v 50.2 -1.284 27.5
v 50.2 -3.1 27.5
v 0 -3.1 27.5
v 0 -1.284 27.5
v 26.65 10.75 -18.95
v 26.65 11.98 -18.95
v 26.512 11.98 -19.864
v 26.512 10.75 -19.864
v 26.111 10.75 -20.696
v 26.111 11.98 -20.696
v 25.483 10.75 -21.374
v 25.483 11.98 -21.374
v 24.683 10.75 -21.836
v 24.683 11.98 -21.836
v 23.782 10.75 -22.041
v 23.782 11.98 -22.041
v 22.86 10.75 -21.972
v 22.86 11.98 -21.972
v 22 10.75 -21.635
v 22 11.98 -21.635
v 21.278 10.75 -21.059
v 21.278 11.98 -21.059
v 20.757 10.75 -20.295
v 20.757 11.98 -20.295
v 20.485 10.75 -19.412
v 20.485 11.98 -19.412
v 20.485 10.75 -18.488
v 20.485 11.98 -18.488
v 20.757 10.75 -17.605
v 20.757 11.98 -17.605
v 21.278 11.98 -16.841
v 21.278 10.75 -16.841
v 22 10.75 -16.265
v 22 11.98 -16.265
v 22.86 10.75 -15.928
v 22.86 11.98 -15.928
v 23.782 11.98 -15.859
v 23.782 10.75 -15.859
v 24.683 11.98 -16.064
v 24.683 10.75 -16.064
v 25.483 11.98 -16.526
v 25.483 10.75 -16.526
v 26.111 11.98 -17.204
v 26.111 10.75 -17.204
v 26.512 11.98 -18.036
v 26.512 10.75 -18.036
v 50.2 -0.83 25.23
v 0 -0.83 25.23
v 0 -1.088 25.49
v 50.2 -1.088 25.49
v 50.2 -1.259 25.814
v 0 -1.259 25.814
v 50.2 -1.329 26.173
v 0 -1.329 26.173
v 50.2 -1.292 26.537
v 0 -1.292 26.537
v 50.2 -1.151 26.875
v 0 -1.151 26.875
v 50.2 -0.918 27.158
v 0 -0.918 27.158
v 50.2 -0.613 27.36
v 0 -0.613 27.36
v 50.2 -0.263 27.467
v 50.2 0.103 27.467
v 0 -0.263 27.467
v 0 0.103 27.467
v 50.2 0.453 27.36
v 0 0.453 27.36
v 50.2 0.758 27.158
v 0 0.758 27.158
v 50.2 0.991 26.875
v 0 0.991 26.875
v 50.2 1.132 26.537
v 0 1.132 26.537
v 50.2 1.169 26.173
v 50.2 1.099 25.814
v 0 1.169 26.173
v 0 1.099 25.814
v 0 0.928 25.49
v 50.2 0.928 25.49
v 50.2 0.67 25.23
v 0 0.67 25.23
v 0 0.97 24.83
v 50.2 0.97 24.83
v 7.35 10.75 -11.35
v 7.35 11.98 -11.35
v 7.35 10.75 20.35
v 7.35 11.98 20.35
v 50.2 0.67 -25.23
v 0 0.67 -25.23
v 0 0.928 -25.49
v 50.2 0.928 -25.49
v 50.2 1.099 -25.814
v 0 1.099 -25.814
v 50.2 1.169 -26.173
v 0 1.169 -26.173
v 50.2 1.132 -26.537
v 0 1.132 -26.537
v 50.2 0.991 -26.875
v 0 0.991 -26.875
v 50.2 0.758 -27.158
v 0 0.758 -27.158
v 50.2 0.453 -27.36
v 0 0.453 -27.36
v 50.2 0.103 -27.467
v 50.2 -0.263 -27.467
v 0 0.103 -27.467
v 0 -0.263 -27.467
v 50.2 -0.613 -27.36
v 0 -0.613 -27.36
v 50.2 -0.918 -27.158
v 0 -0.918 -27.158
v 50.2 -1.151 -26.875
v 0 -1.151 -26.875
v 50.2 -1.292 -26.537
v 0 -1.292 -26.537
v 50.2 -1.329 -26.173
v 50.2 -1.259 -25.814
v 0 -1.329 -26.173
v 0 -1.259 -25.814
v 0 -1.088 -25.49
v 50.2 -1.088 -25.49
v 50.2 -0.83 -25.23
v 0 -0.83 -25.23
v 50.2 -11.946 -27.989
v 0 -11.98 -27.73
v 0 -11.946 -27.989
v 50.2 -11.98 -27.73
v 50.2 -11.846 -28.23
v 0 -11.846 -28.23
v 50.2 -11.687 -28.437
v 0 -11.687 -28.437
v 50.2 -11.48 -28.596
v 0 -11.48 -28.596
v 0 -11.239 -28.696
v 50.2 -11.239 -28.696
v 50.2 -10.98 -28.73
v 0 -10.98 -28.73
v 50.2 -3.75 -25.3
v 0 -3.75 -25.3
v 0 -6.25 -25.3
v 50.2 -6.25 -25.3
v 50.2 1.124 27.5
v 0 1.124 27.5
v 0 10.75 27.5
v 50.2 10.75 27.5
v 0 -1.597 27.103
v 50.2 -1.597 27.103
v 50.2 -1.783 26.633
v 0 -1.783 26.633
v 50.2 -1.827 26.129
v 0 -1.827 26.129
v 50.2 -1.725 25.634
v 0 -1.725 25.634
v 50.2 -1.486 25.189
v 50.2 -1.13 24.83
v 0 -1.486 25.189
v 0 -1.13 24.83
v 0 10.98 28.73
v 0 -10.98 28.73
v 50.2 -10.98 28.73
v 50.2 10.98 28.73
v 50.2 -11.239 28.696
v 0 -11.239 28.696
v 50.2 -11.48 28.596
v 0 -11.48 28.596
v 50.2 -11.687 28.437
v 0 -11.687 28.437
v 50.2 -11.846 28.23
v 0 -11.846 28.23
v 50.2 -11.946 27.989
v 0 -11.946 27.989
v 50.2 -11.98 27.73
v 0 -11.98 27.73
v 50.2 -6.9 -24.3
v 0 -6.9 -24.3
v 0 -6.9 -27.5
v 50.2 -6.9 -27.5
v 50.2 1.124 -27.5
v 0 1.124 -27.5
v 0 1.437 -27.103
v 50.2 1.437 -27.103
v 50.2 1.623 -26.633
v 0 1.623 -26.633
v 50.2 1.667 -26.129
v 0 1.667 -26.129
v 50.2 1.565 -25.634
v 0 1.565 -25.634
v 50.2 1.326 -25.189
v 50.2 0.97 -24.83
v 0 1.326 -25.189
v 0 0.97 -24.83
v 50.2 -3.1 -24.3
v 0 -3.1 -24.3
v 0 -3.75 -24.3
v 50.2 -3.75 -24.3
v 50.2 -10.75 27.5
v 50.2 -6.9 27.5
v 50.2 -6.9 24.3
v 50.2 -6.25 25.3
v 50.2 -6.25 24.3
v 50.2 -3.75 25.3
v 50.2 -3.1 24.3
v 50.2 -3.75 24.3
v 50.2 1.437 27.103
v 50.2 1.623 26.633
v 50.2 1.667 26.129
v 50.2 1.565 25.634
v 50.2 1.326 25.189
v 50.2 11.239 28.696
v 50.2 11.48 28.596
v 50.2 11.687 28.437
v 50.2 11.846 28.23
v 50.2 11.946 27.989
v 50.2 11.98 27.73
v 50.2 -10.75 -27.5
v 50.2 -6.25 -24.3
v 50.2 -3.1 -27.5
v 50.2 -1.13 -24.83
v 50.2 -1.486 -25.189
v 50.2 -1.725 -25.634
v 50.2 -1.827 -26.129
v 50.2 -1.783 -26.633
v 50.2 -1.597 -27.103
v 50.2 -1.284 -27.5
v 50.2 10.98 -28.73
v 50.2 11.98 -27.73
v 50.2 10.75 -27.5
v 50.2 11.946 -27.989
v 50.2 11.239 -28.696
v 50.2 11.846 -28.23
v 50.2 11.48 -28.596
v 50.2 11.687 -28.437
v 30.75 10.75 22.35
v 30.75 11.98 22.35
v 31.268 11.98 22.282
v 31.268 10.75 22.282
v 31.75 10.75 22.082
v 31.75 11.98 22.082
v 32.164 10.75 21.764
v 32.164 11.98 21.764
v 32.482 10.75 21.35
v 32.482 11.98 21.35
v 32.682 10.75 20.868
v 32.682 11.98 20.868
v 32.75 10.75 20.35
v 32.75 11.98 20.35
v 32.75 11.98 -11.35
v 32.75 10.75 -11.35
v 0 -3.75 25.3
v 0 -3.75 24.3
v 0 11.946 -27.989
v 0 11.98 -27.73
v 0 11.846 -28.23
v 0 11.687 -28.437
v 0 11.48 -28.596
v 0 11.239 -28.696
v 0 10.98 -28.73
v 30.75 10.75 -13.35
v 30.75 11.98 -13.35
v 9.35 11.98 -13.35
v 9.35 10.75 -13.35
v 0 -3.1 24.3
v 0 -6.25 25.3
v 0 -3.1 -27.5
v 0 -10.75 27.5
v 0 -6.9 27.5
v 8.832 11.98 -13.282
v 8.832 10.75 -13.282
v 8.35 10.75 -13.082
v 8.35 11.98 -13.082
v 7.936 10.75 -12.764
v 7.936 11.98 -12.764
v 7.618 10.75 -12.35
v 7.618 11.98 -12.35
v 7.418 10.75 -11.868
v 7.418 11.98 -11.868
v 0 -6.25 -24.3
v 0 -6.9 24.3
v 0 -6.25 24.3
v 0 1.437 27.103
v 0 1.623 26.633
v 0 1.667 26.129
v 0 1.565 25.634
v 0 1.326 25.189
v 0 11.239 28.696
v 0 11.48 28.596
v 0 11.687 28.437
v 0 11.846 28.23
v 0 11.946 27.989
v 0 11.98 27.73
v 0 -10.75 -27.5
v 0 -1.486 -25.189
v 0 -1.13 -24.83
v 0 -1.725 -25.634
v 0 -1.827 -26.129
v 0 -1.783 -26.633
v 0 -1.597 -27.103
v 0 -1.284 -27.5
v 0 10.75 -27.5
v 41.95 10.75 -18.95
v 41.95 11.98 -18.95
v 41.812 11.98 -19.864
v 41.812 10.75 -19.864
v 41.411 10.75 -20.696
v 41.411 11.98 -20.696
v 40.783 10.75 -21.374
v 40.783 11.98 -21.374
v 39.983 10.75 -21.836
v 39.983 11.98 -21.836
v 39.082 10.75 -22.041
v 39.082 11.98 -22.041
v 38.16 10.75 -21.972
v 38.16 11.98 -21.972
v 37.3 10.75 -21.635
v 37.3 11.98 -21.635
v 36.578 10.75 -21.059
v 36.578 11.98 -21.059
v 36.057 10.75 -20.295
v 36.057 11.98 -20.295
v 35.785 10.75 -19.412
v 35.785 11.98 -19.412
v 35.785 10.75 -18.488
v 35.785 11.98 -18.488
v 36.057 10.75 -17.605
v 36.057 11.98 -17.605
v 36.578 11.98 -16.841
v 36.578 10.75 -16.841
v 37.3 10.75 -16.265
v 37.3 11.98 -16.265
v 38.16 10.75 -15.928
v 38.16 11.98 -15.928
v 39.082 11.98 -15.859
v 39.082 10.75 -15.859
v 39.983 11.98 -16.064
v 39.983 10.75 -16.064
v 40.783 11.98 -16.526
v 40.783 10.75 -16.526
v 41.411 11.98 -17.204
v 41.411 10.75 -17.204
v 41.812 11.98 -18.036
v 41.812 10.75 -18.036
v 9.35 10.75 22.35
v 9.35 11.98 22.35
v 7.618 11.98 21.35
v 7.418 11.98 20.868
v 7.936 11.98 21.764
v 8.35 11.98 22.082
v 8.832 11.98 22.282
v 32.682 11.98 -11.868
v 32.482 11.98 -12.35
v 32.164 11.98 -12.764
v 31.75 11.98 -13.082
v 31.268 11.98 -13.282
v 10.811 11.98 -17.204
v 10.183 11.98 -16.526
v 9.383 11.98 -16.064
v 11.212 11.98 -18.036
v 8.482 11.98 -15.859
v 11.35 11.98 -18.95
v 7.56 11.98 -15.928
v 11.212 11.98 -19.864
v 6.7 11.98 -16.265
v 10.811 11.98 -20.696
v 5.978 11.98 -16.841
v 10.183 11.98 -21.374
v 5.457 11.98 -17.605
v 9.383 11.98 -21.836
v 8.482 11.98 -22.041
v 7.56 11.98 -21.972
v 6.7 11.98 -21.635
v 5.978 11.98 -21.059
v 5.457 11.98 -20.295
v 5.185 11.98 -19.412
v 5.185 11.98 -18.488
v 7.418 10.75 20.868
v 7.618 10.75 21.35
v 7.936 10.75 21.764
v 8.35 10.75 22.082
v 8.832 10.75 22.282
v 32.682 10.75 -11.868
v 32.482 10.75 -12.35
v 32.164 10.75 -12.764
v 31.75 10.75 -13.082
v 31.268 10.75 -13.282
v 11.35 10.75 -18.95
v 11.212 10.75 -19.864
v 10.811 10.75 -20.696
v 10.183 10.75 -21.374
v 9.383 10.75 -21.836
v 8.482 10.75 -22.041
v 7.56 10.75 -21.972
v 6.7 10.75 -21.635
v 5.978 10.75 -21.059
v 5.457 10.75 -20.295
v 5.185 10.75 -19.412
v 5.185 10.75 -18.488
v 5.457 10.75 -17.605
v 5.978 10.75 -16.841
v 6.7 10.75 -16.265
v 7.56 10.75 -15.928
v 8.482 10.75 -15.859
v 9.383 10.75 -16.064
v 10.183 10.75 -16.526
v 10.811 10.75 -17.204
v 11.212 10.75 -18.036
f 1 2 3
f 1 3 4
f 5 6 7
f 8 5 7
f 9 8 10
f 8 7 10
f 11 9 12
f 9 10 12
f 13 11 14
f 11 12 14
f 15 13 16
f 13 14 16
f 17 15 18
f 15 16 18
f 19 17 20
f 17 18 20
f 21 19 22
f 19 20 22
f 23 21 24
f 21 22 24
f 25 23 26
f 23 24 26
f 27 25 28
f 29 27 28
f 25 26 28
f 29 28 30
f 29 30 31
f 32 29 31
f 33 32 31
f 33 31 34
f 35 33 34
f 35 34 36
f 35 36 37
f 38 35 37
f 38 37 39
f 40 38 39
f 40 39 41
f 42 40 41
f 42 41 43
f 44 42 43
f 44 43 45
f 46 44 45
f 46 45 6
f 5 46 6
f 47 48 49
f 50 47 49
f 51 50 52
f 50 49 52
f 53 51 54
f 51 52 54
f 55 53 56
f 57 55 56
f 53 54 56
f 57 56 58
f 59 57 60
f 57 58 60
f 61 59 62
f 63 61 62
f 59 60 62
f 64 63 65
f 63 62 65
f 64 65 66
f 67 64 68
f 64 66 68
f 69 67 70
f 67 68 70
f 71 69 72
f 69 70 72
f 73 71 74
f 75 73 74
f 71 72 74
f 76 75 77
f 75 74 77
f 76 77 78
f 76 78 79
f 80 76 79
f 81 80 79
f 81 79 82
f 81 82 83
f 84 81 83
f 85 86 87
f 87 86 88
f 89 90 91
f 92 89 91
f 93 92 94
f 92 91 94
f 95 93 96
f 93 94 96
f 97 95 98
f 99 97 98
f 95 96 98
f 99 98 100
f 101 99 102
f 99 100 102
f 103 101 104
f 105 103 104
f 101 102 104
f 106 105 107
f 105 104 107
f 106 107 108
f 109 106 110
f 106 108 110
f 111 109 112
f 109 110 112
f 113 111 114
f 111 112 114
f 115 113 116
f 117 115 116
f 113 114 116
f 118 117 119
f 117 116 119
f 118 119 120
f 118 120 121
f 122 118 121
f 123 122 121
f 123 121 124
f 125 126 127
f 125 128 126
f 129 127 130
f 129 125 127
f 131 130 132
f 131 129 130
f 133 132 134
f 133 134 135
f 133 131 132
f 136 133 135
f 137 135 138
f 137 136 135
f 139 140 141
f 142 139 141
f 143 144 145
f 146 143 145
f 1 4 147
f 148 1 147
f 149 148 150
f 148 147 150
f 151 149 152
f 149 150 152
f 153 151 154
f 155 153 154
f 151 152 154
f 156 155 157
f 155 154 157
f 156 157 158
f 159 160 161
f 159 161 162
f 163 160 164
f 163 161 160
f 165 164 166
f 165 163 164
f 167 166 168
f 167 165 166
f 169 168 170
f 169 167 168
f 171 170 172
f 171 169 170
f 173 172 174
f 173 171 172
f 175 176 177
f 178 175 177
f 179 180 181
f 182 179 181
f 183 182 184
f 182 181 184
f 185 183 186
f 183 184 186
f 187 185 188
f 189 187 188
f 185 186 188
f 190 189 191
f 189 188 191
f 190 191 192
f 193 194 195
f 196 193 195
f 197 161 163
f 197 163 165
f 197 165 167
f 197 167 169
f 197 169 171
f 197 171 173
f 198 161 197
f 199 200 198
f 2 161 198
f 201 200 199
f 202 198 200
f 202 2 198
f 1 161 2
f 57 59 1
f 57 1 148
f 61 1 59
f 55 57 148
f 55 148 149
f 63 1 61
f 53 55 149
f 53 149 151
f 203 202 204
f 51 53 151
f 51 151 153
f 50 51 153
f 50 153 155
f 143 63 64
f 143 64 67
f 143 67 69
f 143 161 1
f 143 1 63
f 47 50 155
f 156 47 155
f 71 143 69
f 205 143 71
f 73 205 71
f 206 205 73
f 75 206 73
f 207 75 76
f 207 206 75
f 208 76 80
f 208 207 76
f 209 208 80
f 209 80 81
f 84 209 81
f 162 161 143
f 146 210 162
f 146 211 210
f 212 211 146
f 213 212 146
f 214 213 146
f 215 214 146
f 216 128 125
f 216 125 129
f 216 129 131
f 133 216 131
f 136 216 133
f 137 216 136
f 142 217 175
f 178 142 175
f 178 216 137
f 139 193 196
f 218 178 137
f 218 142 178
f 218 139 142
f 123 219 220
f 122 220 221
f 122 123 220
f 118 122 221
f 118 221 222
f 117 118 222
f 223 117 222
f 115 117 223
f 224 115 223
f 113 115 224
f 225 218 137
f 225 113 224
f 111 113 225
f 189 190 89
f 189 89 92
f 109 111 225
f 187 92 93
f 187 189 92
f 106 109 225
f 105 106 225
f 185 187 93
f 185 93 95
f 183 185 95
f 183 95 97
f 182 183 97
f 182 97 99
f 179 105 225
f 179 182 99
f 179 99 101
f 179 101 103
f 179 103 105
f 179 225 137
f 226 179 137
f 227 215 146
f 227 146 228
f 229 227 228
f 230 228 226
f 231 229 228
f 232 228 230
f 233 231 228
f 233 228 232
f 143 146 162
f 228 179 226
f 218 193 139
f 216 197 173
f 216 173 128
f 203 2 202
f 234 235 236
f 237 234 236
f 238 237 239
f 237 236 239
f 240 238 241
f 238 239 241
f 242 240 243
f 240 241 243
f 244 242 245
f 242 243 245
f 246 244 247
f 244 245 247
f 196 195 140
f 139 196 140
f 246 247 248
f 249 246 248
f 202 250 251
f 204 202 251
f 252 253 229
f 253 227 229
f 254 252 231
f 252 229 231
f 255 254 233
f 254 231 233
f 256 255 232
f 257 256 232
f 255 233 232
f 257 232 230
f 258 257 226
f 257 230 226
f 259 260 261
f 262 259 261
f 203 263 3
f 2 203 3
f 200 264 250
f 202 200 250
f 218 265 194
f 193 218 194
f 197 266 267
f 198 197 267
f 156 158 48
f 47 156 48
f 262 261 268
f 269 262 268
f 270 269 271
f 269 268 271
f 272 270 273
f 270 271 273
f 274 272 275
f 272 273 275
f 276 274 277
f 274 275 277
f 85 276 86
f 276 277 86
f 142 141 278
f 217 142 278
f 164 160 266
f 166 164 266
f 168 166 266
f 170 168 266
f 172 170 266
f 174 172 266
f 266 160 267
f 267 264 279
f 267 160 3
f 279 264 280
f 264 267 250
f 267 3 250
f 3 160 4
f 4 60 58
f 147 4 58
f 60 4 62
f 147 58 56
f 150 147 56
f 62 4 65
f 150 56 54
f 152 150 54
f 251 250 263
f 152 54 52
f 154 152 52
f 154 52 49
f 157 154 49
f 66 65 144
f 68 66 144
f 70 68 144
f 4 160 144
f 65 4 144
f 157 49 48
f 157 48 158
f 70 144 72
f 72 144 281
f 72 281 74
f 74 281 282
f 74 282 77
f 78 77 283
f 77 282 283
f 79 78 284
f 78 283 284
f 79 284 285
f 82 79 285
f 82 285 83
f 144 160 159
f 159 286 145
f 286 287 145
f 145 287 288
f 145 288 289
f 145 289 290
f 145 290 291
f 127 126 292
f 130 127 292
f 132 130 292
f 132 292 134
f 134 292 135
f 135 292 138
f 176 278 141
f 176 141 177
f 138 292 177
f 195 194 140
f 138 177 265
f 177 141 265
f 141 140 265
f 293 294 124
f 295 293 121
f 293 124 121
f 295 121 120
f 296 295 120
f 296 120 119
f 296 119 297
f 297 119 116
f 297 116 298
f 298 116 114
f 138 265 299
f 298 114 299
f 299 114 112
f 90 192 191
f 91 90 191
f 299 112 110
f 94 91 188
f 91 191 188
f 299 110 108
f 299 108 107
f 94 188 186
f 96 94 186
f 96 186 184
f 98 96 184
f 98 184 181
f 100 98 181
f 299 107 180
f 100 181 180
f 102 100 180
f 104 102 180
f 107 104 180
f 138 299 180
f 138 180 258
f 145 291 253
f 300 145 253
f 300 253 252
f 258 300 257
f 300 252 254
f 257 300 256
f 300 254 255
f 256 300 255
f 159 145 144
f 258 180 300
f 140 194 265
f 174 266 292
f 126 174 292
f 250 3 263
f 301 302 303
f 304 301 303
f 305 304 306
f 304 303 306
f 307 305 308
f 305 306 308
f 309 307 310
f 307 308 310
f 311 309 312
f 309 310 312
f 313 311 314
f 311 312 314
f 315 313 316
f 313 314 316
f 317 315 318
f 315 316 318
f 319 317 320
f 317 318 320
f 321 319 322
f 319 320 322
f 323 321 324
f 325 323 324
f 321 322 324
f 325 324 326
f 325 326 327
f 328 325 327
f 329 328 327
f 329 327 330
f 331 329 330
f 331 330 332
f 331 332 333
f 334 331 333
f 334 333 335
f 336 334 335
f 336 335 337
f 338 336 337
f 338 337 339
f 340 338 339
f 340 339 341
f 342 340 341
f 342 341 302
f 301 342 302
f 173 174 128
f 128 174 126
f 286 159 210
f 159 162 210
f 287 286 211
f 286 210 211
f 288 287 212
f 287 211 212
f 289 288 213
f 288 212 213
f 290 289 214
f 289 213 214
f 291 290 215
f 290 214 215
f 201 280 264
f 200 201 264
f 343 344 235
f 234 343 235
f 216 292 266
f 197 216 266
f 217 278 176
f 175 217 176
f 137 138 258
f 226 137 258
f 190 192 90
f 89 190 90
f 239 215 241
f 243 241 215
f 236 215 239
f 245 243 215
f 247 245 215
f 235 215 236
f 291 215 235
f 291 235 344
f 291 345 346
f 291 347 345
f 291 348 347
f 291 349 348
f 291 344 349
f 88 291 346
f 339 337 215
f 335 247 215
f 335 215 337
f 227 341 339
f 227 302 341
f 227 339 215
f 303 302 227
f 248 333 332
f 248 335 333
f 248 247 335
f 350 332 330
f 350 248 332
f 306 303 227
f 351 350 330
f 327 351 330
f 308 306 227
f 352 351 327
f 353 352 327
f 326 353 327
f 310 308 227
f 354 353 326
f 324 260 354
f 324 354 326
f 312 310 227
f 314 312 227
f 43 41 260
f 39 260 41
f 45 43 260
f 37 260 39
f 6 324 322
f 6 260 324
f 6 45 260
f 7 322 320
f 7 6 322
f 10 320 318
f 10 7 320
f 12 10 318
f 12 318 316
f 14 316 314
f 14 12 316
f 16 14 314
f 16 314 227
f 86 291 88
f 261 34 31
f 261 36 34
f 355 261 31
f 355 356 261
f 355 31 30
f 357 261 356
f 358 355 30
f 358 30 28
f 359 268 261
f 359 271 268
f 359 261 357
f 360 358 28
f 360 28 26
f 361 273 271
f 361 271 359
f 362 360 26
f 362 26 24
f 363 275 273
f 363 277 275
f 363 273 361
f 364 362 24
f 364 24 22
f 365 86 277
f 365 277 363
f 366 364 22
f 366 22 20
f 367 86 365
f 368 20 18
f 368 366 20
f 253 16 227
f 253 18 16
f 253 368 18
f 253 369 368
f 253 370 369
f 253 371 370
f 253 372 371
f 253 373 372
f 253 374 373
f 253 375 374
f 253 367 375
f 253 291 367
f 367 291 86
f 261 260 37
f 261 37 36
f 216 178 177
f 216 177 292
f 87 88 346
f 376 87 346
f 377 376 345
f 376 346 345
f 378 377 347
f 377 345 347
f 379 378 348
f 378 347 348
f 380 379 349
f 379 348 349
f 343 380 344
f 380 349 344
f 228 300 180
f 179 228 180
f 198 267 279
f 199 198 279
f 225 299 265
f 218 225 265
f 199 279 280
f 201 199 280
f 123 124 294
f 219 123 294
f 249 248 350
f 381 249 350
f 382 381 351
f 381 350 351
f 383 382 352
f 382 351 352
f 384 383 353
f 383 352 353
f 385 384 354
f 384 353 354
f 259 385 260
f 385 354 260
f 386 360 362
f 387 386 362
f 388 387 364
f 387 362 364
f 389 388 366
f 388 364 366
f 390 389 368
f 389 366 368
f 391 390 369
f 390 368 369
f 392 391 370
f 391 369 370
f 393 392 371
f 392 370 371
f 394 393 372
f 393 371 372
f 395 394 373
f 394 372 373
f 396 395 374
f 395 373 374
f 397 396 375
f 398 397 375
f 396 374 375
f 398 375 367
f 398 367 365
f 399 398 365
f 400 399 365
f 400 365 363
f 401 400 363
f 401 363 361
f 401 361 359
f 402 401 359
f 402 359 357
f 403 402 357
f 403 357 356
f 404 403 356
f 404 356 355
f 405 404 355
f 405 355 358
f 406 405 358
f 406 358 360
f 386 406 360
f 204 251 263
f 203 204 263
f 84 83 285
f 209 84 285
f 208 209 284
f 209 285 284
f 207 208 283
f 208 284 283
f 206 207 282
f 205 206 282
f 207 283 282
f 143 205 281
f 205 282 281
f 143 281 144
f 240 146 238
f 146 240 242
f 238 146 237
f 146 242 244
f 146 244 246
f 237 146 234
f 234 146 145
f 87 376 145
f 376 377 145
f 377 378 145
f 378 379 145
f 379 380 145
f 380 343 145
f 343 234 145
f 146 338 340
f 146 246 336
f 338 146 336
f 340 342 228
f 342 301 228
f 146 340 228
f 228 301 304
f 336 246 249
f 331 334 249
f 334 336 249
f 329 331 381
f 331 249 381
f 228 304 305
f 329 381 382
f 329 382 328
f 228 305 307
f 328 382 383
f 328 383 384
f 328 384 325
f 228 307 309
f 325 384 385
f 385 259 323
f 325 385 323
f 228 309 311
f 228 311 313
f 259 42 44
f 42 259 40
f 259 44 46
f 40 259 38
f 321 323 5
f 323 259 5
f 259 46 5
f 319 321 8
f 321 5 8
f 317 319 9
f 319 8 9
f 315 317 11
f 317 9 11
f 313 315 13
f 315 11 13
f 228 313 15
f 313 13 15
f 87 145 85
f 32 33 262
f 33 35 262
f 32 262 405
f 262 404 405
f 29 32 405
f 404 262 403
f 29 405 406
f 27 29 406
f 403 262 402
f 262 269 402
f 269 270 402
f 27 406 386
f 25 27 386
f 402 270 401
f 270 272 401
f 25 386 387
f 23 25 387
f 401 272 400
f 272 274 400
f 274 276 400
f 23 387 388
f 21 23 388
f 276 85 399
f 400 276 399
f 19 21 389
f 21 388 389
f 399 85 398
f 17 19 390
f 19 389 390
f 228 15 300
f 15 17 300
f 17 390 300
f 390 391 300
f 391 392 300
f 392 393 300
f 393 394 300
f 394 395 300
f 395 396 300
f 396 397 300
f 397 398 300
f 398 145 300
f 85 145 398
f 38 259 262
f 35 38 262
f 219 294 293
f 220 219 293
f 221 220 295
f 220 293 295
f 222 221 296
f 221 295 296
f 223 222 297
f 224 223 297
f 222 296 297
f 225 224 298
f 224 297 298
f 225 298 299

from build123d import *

# Parameters (mm, degrees)
SKETCH1_W           = 57.46
SKETCH1_H           = 23.96
BOSS_EXTRUDE1_DEPTH = 50.2
FILLET1_R           = 1
CUT_EXTRUDE1_REACH  = 25.96
SKETCH2_R           = 3.1
SKETCH2_R_2         = 3
CUT_EXTRUDE2_REACH  = 25.96


with BuildPart() as part:
    # Sketch1 → Boss-Extrude1 (new body)
    with BuildSketch(Plane(origin=(0, 0, 0), x_dir=(0, 0, -1), z_dir=(1, 0, 0))):
        Rectangle(SKETCH1_W, SKETCH1_H)
        with BuildLine():
            Line((-27.5, 1.123993355), (-27.5, 10.75))
            Line((-27.5, 10.75), (27.5, 10.75))
            Line((27.5, 10.75), (27.5, 1.123993355))
            ThreePointArc((27.5, 1.123993355), (26.129235481, 1.667096595), (24.83, 0.97))
            Line((24.83, 0.97), (25.23, 0.67))
            ThreePointArc((25.23, 0.67), (27.48, -0.08), (25.23, -0.83))
            Line((25.23, -0.83), (24.83, -1.13))
            ThreePointArc((24.83, -1.13), (26.129235481, -1.827096595), (27.5, -1.283993355))
            Line((27.5, -1.283993355), (27.5, -3.1))
            Line((27.5, -3.1), (24.3, -3.1))
            Line((24.3, -3.1), (24.3, -3.75))
            Line((24.3, -3.75), (25.3, -3.75))
            Line((25.3, -3.75), (25.3, -6.25))
            Line((25.3, -6.25), (24.3, -6.25))
            Line((24.3, -6.25), (24.3, -6.9))
            Line((24.3, -6.9), (27.5, -6.9))
            Line((27.5, -6.9), (27.5, -10.75))
            Line((27.5, -10.75), (-27.5, -10.75))
            Line((-27.5, -10.75), (-27.5, -6.9))
            Line((-27.5, -6.9), (-24.3, -6.9))
            Line((-24.3, -6.9), (-24.3, -6.25))
            Line((-24.3, -6.25), (-25.3, -6.25))
            Line((-25.3, -6.25), (-25.3, -3.75))
            Line((-25.3, -3.75), (-24.3, -3.75))
            Line((-24.3, -3.75), (-24.3, -3.1))
            Line((-24.3, -3.1), (-27.5, -3.1))
            Line((-27.5, -3.1), (-27.5, -1.283993355))
            ThreePointArc((-27.5, -1.283993355), (-26.129235481, -1.827096595), (-24.83, -1.13))
            Line((-24.83, -1.13), (-25.23, -0.83))
            ThreePointArc((-25.23, -0.83), (-27.48, -0.08), (-25.23, 0.67))
            Line((-25.23, 0.67), (-24.83, 0.97))
            ThreePointArc((-24.83, 0.97), (-26.129235481, 1.667096595), (-27.5, 1.123993355))
        make_face(mode=Mode.SUBTRACT)
    extrude(amount=BOSS_EXTRUDE1_DEPTH)

    # Fillet1
    fillet1_edges = [part.edges().sort_by_distance(p)[0] for p in [
        (25.1, 11.98, -28.73),
        (25.1, -11.98, -28.73),
        (25.1, -11.98, 28.73),
        (25.1, 11.98, 28.73),
    ]]
    fillet(fillet1_edges, radius=FILLET1_R)

    # Sketch2 → Cut-Extrude1 (cut, up to next)
    with BuildSketch(Plane(origin=(0, 11.98, 0), x_dir=(1, 0, 0), z_dir=(0, 1, 0)), mode=Mode.PRIVATE) as cut_extrude1_sk1:
        with Locations((8.25, 18.95)):
            Circle(SKETCH2_R)
        with Locations((8.25, 18.95)):
            Circle(SKETCH2_R_2, mode=Mode.SUBTRACT)
    cut_extrude1_tool1 = extrude(cut_extrude1_sk1.sketch, amount=-CUT_EXTRUDE1_REACH, mode=Mode.PRIVATE) & part.part
    add(cut_extrude1_tool1.solids().sort_by_distance((5.237681, 11.98, -18.95))[0], mode=Mode.SUBTRACT)
    # Sketch2 → Cut-Extrude1 (cut, up to next)
    with BuildSketch(Plane(origin=(0, 11.98, 0), x_dir=(1, 0, 0), z_dir=(0, 1, 0)), mode=Mode.PRIVATE) as cut_extrude1_sk2:
        with Locations((8.25, 18.95)):
            Circle(SKETCH2_R_2)
    cut_extrude1_tool2 = extrude(cut_extrude1_sk2.sketch, amount=-CUT_EXTRUDE1_REACH, mode=Mode.PRIVATE) & part.part
    add(cut_extrude1_tool2.solids().sort_by_distance((8.25, 11.98, -18.95))[0], mode=Mode.SUBTRACT)
    # Sketch2 → Cut-Extrude1 (cut, up to next)
    with BuildSketch(Plane(origin=(0, 11.98, 0), x_dir=(1, 0, 0), z_dir=(0, 1, 0)), mode=Mode.PRIVATE) as cut_extrude1_sk3:
        with Locations((23.55, 18.95)):
            Circle(SKETCH2_R)
        with Locations((23.55, 18.95)):
            Circle(SKETCH2_R_2, mode=Mode.SUBTRACT)
    cut_extrude1_tool3 = extrude(cut_extrude1_sk3.sketch, amount=-CUT_EXTRUDE1_REACH, mode=Mode.PRIVATE) & part.part
    add(cut_extrude1_tool3.solids().sort_by_distance((20.537681, 11.98, -18.95))[0], mode=Mode.SUBTRACT)
    # Sketch2 → Cut-Extrude1 (cut, up to next)
    with BuildSketch(Plane(origin=(0, 11.98, 0), x_dir=(1, 0, 0), z_dir=(0, 1, 0)), mode=Mode.PRIVATE) as cut_extrude1_sk4:
        with Locations((23.55, 18.95)):
            Circle(SKETCH2_R_2)
    cut_extrude1_tool4 = extrude(cut_extrude1_sk4.sketch, amount=-CUT_EXTRUDE1_REACH, mode=Mode.PRIVATE) & part.part
    add(cut_extrude1_tool4.solids().sort_by_distance((23.55, 11.98, -18.95))[0], mode=Mode.SUBTRACT)
    # Sketch2 → Cut-Extrude1 (cut, up to next)
    with BuildSketch(Plane(origin=(0, 11.98, 0), x_dir=(1, 0, 0), z_dir=(0, 1, 0)), mode=Mode.PRIVATE) as cut_extrude1_sk5:
        with Locations((38.85, 18.95)):
            Circle(SKETCH2_R)
        with Locations((38.85, 18.95)):
            Circle(SKETCH2_R_2, mode=Mode.SUBTRACT)
    cut_extrude1_tool5 = extrude(cut_extrude1_sk5.sketch, amount=-CUT_EXTRUDE1_REACH, mode=Mode.PRIVATE) & part.part
    add(cut_extrude1_tool5.solids().sort_by_distance((35.837681, 11.98, -18.95))[0], mode=Mode.SUBTRACT)
    # Sketch2 → Cut-Extrude1 (cut, up to next)
    with BuildSketch(Plane(origin=(0, 11.98, 0), x_dir=(1, 0, 0), z_dir=(0, 1, 0)), mode=Mode.PRIVATE) as cut_extrude1_sk6:
        with Locations((38.85, 18.95)):
            Circle(SKETCH2_R_2)
    cut_extrude1_tool6 = extrude(cut_extrude1_sk6.sketch, amount=-CUT_EXTRUDE1_REACH, mode=Mode.PRIVATE) & part.part
    add(cut_extrude1_tool6.solids().sort_by_distance((38.85, 11.98, -18.95))[0], mode=Mode.SUBTRACT)

    # Sketch3 → Cut-Extrude2 (cut, up to next)
    with BuildSketch(Plane(origin=(0, 11.98, 0), x_dir=(1, 0, 0), z_dir=(0, 1, 0)), mode=Mode.PRIVATE) as cut_extrude2_sk1:
        with BuildLine():
            Line((7.35, 11.35), (7.35, -20.35))
            ThreePointArc((7.35, -20.35), (7.935786438, -21.764213562), (9.35, -22.35))
            Line((9.35, -22.35), (30.75, -22.35))
            ThreePointArc((30.75, -22.35), (32.164213562, -21.764213562), (32.75, -20.35))
            Line((32.75, -20.35), (32.75, 11.35))
            ThreePointArc((32.75, 11.35), (32.164213562, 12.764213562), (30.75, 13.35))
            Line((30.75, 13.35), (9.35, 13.35))
            ThreePointArc((9.35, 13.35), (7.935786438, 12.764213562), (7.35, 11.35))
        make_face()
    cut_extrude2_tool1 = extrude(cut_extrude2_sk1.sketch, amount=-CUT_EXTRUDE2_REACH, mode=Mode.PRIVATE) & part.part
    add(cut_extrude2_tool1.solids().sort_by_distance((20.05, 11.98, 4.5))[0], mode=Mode.SUBTRACT)


solid = part.part
